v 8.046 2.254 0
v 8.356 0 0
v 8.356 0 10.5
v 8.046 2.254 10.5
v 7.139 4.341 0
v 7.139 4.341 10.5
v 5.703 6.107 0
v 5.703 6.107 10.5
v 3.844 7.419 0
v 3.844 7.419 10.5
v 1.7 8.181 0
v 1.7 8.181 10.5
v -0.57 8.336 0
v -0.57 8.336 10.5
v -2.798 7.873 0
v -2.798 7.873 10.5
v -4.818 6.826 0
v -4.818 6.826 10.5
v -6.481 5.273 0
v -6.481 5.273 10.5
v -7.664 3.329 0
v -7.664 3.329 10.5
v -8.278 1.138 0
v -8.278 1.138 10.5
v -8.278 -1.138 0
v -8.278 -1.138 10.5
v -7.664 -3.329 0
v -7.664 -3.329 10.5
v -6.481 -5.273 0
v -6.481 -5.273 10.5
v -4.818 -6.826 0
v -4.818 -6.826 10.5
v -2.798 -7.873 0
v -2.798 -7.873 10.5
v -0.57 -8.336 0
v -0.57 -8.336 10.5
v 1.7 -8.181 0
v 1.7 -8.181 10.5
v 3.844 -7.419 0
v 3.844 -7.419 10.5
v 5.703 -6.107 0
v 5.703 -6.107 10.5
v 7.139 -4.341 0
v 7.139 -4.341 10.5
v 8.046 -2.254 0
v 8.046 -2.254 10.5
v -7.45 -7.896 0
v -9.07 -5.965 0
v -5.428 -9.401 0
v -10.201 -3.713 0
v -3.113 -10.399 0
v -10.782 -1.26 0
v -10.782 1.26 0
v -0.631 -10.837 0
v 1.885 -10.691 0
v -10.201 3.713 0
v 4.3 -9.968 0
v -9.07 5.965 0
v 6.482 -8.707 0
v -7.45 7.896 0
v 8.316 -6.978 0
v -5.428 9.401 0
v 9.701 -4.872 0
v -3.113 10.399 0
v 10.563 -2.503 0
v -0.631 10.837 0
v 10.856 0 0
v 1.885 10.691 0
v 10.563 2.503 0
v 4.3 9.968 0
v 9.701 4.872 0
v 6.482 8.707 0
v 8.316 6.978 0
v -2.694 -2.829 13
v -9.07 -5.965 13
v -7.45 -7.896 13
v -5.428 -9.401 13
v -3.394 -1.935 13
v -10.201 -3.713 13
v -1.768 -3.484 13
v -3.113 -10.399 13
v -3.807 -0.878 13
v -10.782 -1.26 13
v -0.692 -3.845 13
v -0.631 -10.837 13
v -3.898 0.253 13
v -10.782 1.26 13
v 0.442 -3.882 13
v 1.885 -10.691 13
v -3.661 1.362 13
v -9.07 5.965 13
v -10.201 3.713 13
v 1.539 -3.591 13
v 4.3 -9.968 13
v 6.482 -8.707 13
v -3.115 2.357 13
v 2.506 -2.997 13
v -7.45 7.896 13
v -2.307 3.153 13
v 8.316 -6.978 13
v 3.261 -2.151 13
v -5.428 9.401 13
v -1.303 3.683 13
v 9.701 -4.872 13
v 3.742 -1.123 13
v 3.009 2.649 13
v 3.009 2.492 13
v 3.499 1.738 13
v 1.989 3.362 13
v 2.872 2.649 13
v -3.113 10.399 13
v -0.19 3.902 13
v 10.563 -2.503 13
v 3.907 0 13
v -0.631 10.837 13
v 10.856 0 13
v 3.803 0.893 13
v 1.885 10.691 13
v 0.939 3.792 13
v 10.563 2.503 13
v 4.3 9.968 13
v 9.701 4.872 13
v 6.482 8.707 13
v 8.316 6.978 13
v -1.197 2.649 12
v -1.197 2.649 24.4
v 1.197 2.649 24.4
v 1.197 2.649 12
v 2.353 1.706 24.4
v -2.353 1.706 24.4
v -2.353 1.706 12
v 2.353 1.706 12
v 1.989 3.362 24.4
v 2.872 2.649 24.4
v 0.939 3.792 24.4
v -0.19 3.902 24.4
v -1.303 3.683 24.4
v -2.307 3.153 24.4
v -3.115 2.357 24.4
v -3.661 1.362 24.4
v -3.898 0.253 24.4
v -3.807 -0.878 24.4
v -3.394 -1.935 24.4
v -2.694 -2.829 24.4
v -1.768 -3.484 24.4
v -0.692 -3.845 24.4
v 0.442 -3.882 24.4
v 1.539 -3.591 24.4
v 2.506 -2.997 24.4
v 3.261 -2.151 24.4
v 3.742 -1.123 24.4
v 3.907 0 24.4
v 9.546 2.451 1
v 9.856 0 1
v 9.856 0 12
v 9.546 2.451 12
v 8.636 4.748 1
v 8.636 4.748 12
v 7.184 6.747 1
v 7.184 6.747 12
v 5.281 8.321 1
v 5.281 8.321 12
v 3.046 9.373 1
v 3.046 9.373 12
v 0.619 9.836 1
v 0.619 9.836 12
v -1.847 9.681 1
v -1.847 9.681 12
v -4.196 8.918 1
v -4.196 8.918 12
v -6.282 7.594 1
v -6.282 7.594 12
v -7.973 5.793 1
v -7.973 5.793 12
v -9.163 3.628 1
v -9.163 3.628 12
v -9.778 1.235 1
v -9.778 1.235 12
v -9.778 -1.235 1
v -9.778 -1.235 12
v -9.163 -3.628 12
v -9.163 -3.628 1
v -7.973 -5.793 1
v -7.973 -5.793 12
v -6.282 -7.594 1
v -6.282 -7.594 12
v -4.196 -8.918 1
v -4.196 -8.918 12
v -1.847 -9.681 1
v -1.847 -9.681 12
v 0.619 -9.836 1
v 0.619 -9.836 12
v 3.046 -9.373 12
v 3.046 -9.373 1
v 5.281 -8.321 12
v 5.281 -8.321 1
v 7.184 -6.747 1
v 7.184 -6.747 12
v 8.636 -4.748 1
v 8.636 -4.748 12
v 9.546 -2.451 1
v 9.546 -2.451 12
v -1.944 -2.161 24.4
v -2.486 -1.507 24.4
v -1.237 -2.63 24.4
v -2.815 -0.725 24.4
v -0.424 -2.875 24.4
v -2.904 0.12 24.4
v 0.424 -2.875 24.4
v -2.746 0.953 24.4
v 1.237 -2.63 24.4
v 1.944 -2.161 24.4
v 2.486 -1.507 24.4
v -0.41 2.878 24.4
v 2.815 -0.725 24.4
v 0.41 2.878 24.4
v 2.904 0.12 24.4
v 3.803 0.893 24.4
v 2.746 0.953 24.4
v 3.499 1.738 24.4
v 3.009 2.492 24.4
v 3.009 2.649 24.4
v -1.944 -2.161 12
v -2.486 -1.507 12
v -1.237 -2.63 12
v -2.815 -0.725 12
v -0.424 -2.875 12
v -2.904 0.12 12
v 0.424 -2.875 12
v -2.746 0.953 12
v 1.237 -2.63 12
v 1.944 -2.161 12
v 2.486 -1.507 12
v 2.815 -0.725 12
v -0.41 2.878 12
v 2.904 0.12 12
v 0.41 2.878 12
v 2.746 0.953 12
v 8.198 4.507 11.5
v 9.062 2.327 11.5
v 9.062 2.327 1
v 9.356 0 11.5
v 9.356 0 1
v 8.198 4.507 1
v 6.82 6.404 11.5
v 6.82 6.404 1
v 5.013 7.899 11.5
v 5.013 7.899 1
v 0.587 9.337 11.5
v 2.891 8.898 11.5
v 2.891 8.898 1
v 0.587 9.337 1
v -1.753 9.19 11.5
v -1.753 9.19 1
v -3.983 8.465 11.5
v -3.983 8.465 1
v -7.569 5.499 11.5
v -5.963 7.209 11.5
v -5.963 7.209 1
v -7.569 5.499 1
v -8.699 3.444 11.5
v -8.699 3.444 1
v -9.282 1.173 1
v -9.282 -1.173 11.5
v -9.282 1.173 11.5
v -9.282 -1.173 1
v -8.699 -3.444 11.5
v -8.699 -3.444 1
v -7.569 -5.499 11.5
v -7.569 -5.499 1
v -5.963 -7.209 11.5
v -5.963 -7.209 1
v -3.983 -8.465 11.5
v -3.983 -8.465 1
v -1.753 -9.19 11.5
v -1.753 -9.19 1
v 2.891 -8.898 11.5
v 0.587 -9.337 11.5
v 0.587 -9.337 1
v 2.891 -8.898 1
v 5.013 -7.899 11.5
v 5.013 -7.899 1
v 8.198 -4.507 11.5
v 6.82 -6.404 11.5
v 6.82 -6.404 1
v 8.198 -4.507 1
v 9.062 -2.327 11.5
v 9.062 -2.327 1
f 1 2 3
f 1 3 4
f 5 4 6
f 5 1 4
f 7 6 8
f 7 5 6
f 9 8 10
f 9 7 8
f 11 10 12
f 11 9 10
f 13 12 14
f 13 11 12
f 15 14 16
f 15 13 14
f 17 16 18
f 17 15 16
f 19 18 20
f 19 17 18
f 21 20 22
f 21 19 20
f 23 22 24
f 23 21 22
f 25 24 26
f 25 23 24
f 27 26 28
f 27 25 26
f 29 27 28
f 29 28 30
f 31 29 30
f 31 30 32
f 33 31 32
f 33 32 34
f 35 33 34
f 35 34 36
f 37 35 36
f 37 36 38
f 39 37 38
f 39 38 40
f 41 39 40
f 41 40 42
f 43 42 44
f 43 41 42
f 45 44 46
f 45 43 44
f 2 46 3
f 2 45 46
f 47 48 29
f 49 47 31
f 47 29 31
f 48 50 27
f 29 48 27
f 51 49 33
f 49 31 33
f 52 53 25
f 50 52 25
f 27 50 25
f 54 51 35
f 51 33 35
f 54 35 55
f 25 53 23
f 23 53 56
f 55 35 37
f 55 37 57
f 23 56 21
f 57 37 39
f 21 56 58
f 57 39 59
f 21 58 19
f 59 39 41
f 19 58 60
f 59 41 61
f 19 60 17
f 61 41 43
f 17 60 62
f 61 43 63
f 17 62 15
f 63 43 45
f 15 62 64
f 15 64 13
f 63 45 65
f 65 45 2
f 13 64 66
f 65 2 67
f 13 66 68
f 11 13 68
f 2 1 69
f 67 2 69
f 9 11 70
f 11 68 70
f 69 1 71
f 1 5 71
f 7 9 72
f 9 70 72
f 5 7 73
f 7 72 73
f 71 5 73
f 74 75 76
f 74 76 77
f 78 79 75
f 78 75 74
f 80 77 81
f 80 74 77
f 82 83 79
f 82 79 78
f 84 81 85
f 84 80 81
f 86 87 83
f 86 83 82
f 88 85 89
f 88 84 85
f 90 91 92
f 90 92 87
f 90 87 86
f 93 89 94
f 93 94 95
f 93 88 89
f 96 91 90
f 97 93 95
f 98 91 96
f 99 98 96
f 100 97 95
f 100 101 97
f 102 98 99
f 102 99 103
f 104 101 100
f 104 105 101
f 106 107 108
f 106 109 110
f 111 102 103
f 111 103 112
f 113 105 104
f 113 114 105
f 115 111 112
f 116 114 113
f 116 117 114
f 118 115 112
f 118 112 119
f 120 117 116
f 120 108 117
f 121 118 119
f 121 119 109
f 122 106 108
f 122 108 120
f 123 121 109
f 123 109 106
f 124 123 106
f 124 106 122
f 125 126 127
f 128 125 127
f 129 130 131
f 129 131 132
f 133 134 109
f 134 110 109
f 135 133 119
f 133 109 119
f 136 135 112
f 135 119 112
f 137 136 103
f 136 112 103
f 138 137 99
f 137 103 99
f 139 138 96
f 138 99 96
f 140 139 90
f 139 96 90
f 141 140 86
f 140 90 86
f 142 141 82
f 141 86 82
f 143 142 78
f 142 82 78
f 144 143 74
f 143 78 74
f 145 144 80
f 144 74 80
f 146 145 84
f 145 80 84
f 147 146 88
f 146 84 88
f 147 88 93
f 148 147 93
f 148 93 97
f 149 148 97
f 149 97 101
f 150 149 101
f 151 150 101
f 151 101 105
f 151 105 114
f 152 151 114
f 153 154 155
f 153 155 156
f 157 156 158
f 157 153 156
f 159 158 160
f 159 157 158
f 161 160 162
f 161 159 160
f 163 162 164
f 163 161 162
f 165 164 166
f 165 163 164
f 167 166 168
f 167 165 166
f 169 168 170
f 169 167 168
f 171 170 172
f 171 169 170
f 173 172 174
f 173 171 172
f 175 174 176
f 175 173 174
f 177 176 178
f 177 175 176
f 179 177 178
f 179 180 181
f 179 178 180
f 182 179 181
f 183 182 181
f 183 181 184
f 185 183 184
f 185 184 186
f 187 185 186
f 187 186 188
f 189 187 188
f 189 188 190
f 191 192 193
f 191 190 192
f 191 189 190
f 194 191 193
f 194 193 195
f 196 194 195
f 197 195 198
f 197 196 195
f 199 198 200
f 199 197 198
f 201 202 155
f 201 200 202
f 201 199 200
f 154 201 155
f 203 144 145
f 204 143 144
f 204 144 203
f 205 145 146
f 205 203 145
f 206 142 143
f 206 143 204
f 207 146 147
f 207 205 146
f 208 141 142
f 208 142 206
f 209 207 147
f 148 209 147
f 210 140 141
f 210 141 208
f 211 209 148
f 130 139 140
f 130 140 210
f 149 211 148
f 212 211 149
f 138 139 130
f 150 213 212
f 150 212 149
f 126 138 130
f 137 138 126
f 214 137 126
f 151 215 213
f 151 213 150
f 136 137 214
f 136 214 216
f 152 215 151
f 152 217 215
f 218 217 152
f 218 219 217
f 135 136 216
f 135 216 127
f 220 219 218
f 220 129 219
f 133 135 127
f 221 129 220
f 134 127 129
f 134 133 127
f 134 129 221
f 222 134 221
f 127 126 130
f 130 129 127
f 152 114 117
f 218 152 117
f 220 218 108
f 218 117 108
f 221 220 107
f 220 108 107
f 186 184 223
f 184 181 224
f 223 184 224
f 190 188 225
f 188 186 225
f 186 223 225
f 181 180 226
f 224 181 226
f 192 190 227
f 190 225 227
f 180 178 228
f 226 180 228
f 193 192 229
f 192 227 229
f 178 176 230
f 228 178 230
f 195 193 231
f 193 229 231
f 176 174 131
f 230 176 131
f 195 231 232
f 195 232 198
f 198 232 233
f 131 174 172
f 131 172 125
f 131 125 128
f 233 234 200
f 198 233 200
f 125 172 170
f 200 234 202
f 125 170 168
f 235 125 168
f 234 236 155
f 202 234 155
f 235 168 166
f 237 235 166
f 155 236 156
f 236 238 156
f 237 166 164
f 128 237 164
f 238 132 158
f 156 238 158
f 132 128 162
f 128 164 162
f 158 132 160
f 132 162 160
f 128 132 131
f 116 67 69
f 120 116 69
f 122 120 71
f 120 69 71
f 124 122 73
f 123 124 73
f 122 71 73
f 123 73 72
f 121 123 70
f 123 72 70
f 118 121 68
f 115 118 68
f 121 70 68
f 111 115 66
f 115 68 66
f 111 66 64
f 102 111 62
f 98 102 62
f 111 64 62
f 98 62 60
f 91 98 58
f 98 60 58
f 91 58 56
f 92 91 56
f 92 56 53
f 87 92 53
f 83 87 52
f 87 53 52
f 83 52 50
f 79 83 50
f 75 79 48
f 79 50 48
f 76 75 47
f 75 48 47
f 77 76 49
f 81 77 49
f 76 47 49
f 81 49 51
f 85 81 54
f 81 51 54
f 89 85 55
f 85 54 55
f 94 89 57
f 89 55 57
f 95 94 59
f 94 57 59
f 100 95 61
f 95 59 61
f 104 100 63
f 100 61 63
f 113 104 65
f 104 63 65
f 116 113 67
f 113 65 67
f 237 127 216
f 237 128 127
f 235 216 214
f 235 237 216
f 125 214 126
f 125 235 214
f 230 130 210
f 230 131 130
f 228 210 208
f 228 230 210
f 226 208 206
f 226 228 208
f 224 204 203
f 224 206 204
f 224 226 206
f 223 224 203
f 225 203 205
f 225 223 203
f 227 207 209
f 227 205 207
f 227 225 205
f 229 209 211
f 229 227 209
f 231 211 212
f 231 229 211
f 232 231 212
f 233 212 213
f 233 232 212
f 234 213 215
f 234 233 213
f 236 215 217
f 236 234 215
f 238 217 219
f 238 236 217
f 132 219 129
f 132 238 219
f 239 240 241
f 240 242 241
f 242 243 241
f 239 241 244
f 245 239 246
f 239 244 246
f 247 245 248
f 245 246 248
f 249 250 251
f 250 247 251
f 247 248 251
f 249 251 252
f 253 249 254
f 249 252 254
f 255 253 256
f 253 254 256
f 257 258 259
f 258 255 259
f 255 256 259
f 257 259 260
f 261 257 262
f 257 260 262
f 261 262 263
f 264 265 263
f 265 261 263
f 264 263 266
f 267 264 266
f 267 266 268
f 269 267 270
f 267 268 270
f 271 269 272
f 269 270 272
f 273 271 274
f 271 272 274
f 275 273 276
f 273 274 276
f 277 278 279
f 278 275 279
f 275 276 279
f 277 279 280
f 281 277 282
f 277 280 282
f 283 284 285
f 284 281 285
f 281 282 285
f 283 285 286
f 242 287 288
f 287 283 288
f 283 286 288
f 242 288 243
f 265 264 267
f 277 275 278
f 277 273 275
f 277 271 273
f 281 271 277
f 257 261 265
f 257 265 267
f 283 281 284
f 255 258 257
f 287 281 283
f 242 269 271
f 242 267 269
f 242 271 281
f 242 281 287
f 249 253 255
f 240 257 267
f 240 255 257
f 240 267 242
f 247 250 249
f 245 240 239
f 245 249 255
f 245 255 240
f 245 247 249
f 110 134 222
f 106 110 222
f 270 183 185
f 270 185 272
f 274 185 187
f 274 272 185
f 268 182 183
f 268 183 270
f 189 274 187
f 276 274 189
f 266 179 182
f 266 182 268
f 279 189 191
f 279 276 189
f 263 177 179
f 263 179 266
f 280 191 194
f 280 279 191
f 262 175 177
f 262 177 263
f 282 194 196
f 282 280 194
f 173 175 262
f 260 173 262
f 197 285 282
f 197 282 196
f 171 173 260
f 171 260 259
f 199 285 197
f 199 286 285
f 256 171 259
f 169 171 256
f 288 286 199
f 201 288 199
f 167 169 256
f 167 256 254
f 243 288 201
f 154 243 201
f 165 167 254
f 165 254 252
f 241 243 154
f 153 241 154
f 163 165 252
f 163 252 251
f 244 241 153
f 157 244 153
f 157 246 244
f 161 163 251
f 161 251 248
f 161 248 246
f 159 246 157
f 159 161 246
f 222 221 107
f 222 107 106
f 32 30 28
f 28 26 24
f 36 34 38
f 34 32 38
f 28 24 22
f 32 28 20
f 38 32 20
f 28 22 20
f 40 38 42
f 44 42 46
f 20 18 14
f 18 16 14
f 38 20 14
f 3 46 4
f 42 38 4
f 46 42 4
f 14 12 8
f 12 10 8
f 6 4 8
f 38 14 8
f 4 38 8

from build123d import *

# Parameters (mm, degrees)
F0_R     = 10.8555352801
F1_DEPTH = 13
F2_T     = -2.5
F3_R     = 3.906627993
F4_DEPTH = 11.4
F5_T     = -1
F6_W     = 5.8806912699
F6_H     = 0.9425205584
F7_DEPTH = 12.4


with BuildPart() as f1:
    # F0 (on Top) → F1 (new body)
    with BuildSketch(Plane.XY):
        Circle(F0_R)
    extrude(amount=F1_DEPTH)

    # F2
    f2_openings = [f1.faces().sort_by_distance(p)[0] for p in [
        (0, 0, 0),
    ]]
    offset(amount=F2_T, openings=f2_openings)

    # F3 (on face) → F4 (join)
    with BuildSketch(Plane.XY.offset(13)):
        Circle(F3_R)
    extrude(amount=F4_DEPTH)

    # F5
    f5_openings = [f1.faces().sort_by_distance(p)[0] for p in [
        (0, 0, 24.4),
    ]]
    offset(amount=F5_T, openings=f5_openings, kind=Kind.INTERSECTION)

    # F6 (on face) → F7 (join)
    with BuildSketch(Plane.XY.offset(24.4)):
        with Locations((0.0686239588, 2.1773161103)):
            Rectangle(F6_W, F6_H)
    extrude(amount=-F7_DEPTH)


solid = f1.part
